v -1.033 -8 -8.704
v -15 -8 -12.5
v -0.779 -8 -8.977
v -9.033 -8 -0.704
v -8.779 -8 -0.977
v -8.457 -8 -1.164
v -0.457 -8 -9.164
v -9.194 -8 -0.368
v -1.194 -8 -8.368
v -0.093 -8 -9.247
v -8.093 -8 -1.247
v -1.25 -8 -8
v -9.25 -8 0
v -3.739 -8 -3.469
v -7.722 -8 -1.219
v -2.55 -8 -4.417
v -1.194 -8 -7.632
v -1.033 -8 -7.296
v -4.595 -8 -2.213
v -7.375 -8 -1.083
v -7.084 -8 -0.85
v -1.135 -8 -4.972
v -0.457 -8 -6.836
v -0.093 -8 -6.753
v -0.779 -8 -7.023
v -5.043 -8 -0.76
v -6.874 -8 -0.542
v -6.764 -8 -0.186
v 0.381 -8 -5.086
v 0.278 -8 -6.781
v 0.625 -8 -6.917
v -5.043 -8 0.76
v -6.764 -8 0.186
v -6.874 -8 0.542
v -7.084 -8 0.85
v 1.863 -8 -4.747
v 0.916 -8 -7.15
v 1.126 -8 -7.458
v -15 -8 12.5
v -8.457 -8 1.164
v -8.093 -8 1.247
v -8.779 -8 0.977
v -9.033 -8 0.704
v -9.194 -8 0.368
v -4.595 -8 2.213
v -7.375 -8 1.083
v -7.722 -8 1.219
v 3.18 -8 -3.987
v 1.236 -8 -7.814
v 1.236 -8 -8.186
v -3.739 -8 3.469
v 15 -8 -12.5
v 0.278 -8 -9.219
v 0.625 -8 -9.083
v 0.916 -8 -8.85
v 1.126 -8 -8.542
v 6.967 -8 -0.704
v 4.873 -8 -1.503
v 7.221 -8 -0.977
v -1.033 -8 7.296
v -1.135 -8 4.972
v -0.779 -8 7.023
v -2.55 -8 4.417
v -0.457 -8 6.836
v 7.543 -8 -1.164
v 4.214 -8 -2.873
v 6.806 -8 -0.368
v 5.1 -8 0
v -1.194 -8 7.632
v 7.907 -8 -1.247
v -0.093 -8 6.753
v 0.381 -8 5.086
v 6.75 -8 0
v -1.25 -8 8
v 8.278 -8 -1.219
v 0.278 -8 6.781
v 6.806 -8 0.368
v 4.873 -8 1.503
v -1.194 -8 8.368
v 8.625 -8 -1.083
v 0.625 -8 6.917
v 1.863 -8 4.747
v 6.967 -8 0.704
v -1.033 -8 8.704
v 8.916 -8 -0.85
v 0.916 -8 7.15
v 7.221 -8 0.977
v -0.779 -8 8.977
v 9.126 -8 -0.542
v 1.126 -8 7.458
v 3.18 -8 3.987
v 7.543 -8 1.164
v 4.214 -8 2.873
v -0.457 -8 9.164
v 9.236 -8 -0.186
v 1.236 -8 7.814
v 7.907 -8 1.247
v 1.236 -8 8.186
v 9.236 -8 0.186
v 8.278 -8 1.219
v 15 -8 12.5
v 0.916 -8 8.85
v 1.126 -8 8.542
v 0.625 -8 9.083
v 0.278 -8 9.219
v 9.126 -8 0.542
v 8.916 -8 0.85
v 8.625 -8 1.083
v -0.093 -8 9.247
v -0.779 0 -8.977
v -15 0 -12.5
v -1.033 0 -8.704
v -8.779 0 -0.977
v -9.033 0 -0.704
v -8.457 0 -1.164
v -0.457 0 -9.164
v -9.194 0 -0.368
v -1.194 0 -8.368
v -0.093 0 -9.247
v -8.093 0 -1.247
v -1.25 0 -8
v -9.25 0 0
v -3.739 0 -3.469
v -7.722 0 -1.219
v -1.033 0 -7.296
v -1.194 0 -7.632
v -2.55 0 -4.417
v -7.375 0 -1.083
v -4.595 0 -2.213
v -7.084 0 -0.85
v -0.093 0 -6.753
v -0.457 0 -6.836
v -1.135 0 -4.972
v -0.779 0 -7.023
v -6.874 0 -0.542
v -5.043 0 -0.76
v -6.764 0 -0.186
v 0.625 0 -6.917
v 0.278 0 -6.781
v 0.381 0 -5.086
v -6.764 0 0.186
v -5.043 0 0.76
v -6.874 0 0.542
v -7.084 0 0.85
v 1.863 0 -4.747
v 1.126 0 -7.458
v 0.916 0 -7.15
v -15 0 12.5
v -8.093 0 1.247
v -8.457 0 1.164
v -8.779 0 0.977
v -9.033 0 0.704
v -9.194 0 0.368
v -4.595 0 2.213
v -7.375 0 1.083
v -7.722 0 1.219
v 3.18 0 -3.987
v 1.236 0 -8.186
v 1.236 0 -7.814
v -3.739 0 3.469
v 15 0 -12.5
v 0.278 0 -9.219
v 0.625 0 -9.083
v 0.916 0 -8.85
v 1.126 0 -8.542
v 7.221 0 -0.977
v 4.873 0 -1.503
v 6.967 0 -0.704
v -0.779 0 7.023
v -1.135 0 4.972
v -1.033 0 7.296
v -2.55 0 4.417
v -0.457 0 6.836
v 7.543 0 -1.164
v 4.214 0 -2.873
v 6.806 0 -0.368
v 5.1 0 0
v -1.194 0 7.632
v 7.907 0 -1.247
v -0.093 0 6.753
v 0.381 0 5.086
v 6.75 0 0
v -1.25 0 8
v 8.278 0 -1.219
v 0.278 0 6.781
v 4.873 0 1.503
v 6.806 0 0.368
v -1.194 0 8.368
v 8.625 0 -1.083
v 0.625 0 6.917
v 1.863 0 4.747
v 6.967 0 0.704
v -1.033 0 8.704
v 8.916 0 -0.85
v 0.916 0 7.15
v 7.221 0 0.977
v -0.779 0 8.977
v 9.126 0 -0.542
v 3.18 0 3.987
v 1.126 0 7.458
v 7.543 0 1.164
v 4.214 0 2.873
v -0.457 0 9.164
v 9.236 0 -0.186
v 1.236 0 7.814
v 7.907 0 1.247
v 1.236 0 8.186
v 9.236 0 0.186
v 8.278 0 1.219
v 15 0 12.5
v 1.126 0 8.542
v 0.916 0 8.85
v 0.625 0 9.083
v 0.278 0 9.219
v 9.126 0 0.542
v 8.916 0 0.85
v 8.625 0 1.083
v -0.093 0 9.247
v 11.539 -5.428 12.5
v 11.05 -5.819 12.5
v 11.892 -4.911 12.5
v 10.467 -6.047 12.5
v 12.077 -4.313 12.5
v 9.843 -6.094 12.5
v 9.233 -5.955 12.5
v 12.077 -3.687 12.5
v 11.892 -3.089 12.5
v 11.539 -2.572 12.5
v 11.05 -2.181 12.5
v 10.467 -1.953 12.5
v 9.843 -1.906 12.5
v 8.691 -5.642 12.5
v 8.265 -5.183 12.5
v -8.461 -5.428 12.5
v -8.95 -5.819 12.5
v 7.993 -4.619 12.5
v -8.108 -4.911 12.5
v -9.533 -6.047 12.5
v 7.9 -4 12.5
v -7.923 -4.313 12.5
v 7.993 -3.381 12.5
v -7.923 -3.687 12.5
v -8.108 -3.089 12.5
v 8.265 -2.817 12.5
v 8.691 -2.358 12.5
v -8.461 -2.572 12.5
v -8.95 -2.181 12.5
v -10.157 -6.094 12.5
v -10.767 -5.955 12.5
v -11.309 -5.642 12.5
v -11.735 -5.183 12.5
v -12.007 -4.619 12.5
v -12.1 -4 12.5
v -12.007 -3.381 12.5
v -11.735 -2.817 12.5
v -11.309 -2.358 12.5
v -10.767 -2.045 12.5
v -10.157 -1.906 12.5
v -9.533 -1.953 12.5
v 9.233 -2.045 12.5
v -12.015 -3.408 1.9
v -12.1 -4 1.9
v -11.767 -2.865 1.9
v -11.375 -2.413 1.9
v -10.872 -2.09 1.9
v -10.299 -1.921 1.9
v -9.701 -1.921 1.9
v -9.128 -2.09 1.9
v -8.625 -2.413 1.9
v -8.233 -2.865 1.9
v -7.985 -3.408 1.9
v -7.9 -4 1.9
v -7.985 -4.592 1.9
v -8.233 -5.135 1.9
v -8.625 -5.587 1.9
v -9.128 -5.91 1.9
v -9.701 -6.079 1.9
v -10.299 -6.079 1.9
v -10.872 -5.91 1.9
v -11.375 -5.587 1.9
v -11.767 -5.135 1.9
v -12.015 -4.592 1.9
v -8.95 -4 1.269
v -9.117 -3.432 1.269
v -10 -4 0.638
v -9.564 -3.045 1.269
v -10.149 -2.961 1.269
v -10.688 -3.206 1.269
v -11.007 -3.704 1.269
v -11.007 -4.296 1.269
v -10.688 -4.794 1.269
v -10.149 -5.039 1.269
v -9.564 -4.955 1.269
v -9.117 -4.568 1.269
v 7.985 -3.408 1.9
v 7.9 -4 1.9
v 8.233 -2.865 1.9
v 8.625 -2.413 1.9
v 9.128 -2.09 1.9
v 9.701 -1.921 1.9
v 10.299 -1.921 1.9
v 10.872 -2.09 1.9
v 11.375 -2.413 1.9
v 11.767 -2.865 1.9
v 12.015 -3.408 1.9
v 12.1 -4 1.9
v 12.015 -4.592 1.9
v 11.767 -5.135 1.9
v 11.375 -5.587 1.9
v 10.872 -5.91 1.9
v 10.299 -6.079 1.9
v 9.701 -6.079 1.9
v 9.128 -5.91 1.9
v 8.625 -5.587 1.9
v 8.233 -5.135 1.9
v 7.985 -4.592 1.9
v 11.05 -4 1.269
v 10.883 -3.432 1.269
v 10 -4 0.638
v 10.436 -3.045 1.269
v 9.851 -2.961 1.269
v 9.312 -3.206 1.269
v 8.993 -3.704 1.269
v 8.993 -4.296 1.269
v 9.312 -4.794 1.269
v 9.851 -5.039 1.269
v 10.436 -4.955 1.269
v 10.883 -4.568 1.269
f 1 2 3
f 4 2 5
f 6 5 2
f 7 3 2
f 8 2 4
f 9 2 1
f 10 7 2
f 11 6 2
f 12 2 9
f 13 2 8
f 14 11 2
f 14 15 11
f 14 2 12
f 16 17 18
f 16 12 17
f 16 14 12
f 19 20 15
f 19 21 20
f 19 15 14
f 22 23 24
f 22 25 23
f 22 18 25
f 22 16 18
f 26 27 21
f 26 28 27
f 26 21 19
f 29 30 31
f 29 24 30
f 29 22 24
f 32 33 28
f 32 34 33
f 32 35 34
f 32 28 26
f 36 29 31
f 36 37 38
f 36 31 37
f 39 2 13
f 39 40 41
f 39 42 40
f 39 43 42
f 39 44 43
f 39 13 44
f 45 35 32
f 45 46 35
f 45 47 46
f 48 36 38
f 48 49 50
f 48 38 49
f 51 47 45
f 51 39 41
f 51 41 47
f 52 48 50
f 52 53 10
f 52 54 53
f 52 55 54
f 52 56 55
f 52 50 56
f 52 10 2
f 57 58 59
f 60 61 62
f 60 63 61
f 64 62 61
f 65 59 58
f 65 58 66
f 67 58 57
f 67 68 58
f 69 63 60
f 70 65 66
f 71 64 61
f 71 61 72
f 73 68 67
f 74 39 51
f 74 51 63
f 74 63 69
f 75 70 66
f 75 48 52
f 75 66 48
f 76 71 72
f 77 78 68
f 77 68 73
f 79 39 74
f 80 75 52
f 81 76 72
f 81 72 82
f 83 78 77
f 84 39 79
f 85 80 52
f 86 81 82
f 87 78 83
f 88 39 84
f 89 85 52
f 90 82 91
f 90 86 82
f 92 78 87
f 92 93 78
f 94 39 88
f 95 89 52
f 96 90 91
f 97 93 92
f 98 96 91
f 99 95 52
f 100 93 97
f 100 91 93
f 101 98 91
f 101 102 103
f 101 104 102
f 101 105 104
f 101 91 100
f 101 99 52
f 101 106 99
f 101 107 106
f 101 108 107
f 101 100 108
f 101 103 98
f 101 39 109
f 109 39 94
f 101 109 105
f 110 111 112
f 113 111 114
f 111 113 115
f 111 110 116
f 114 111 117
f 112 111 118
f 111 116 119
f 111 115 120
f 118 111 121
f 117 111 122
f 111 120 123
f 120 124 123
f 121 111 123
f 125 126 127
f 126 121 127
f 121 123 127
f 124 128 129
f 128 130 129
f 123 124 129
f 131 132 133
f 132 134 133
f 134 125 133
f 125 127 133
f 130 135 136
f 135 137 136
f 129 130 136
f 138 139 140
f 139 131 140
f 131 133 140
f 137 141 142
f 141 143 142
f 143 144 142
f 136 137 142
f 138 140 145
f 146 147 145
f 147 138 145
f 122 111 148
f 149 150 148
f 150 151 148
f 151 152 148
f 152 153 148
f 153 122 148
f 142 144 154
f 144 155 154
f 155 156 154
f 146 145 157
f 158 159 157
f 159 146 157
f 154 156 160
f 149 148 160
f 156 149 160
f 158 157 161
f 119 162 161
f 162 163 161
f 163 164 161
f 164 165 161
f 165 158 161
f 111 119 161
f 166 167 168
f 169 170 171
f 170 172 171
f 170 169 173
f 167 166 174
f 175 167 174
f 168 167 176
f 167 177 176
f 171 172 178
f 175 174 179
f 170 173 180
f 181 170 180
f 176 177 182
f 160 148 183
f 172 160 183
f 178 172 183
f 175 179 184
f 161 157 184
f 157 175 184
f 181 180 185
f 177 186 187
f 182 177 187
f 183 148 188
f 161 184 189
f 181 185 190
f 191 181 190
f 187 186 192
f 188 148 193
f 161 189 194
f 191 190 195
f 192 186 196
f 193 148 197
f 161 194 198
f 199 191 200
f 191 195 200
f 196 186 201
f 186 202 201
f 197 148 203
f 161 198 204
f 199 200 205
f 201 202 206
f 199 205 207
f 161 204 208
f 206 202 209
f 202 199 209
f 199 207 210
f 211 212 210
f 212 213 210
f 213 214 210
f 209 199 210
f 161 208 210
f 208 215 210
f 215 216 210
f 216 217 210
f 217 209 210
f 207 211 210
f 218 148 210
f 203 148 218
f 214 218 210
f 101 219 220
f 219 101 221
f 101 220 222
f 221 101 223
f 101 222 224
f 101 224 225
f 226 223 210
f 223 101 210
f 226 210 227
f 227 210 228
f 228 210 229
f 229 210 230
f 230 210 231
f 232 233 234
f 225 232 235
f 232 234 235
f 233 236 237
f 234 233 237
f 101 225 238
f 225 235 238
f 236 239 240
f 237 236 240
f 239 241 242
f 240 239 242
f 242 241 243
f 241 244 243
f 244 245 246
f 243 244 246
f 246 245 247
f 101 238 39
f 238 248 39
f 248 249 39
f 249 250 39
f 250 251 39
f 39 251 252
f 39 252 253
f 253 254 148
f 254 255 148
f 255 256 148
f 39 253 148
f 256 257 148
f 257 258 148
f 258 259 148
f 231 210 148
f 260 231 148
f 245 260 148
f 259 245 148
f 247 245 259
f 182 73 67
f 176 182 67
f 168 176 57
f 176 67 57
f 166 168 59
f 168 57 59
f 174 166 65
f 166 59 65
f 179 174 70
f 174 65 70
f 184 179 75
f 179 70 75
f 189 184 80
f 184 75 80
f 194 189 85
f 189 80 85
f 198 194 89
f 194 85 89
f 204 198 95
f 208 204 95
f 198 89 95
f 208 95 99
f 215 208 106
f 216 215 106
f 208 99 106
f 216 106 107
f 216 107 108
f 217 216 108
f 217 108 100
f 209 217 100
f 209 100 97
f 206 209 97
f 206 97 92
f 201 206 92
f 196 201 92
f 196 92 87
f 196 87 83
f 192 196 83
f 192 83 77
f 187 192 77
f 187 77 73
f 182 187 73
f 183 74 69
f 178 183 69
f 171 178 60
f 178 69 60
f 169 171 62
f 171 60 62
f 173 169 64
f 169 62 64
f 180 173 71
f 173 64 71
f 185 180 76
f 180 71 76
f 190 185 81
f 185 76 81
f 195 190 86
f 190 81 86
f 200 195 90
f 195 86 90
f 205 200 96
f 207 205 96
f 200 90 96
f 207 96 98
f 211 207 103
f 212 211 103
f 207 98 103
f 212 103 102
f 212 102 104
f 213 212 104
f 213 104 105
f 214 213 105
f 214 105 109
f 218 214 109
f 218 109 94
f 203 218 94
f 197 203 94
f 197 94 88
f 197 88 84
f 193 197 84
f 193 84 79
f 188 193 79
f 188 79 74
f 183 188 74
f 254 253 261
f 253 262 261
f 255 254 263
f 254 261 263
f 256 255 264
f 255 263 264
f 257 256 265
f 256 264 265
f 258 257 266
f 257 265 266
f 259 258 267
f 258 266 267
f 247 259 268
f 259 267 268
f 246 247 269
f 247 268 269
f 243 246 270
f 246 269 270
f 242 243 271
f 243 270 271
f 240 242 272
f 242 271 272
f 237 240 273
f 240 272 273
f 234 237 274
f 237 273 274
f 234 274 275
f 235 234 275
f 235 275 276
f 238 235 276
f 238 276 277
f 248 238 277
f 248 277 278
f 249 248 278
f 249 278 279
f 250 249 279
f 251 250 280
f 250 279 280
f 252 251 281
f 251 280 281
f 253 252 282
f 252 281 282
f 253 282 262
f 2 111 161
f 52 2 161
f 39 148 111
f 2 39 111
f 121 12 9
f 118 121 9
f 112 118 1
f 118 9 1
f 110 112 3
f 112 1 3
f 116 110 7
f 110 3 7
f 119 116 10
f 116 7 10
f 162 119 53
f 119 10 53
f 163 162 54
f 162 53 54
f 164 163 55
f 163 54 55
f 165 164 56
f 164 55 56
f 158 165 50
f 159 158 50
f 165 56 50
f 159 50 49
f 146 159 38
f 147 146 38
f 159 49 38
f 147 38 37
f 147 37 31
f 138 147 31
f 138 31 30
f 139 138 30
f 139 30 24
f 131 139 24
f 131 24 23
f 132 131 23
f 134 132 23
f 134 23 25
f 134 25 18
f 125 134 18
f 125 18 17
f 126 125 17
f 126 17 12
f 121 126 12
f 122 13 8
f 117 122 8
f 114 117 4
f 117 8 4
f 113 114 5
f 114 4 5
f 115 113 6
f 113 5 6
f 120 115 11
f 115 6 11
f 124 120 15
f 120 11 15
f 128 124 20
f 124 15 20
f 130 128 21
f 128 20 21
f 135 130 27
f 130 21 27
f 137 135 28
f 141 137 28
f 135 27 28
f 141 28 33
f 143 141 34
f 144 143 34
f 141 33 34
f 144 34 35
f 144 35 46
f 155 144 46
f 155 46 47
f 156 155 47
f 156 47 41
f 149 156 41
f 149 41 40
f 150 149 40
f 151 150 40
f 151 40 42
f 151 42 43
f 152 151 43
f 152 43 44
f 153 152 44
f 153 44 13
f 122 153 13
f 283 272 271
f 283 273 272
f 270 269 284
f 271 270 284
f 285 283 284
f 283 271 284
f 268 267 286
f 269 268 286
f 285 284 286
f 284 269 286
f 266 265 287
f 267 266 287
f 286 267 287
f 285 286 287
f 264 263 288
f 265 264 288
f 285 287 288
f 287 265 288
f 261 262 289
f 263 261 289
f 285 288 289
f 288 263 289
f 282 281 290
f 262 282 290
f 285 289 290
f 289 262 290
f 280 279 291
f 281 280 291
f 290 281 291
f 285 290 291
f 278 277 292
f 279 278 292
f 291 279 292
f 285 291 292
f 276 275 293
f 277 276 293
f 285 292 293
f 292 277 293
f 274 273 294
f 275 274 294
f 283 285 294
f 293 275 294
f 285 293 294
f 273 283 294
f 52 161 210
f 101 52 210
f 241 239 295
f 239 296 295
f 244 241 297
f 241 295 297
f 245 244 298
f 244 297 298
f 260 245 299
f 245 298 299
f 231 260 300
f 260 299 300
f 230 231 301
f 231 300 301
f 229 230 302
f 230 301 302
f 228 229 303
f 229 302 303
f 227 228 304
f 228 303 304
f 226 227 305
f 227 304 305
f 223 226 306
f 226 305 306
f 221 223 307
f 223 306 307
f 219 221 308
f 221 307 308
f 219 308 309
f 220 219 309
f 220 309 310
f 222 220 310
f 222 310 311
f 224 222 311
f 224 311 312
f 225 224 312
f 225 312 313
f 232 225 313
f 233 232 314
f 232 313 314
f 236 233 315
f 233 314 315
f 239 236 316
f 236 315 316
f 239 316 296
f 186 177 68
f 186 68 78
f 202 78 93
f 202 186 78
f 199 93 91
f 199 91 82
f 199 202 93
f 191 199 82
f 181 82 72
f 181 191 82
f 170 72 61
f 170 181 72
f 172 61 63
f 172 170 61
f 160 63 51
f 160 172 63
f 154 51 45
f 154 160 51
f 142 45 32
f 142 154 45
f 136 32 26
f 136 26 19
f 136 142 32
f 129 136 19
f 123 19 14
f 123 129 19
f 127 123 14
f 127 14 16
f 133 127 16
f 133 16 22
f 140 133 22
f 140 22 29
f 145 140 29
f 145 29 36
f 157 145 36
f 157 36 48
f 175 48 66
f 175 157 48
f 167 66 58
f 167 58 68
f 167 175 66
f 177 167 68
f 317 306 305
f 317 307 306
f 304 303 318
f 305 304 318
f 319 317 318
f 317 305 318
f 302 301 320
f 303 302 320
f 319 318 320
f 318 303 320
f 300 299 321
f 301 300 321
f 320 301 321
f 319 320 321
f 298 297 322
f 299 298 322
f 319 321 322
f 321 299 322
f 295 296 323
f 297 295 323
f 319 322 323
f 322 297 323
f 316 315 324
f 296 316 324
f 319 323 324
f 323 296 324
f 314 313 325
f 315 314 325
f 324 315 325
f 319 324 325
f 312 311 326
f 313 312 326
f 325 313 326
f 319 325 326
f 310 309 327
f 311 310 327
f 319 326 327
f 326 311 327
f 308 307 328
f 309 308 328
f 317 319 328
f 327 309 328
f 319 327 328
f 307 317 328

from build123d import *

# Parameters (mm, degrees)
F0_R     = 5.1
F1_DEPTH = 8
F3_D     = 2.5
F4_D     = 4.2
F4_DEPTH = 10.6
F4_TIP   = 1.2618073


with BuildPart() as f1:
    # F0 (on Front) → F1 (new body)
    with BuildSketch(Plane.XZ):
        with BuildLine():
            ThreePointArc((-7.80859375, 1.7395009766), (-5.6568542495, 5.6568542495), (-1.7395009766, 7.80859375))
            ThreePointArc((-1.7395009766, 7.80859375), (-1.3033535471, 9.1678054338), (0, 9.75))
            Line((0, 9.75), (0, 12.5))
            Line((0, 12.5), (-15, 12.5))
            Line((-15, 12.5), (-15, -12.5))
            Line((-15, -12.5), (0, -12.5))
            Line((0, -12.5), (0, -9.75))
            ThreePointArc((0, -9.75), (-1.3033535471, -9.1678054338), (-1.7395009766, -7.80859375))
            ThreePointArc((-1.7395009766, -7.80859375), (-5.6568542495, -5.6568542495), (-7.80859375, -1.7395009766))
            ThreePointArc((-7.80859375, -1.7395009766), (-9.75, 0), (-7.80859375, 1.7395009766))
        make_face()
        with BuildLine():
            ThreePointArc((1.7395009766, 7.80859375), (5.6568542495, 5.6568542495), (7.80859375, 1.7395009766))
            ThreePointArc((7.80859375, 1.7395009766), (9.1678054338, 1.3033535471), (9.75, 0))
            ThreePointArc((9.75, 0), (9.1678054338, -1.3033535471), (7.80859375, -1.7395009766))
            ThreePointArc((7.80859375, -1.7395009766), (5.6568542495, -5.6568542495), (1.7395009766, -7.80859375))
            ThreePointArc((1.7395009766, -7.80859375), (1.7473732728, -7.9041530099), (1.75, -8))
            ThreePointArc((1.75, -8), (1.2374368671, -9.2374368671), (0, -9.75))
            Line((0, -9.75), (0, -12.5))
            Line((0, -12.5), (15, -12.5))
            Line((15, -12.5), (15, 12.5))
            Line((15, 12.5), (0, 12.5))
            Line((0, 12.5), (0, 9.75))
            ThreePointArc((0, 9.75), (1.2374368671, 9.2374368671), (1.75, 8))
            ThreePointArc((1.75, 8), (1.7473732728, 7.9041530099), (1.7395009766, 7.80859375))
        make_face()
        with BuildLine():
            ThreePointArc((7.80859375, -1.7395009766), (6.25, 0), (7.80859375, 1.7395009766))
            ThreePointArc((7.80859375, 1.7395009766), (5.6568542495, 5.6568542495), (1.7395009766, 7.80859375))
            ThreePointArc((1.7395009766, 7.80859375), (0, 6.25), (-1.7395009766, 7.80859375))
            ThreePointArc((-1.7395009766, 7.80859375), (-5.6568542495, 5.6568542495), (-7.80859375, 1.7395009766))
            ThreePointArc((-7.80859375, 1.7395009766), (-6.6966464529, 1.1678054338), (-6.25, 0))
            ThreePointArc((-6.25, 0), (-6.6966464529, -1.1678054338), (-7.80859375, -1.7395009766))
            ThreePointArc((-7.80859375, -1.7395009766), (-5.6568542495, -5.6568542495), (-1.7395009766, -7.80859375))
            ThreePointArc((-1.7395009766, -7.80859375), (0, -6.25), (1.7395009766, -7.80859375))
            ThreePointArc((1.7395009766, -7.80859375), (5.6568542495, -5.6568542495), (7.80859375, -1.7395009766))
        make_face()
        Circle(F0_R, mode=Mode.SUBTRACT)
        with BuildLine():
            ThreePointArc((-1.7395009766, 7.80859375), (0, 8), (1.7395009766, 7.80859375))
            ThreePointArc((1.7395009766, 7.80859375), (1.7473732728, 7.9041530099), (1.75, 8))
            ThreePointArc((1.75, 8), (1.2374368671, 9.2374368671), (0, 9.75))
            ThreePointArc((0, 9.75), (-1.3033535471, 9.1678054338), (-1.7395009766, 7.80859375))
        make_face()
        with BuildLine():
            ThreePointArc((-7.80859375, -1.7395009766), (-8, 0), (-7.80859375, 1.7395009766))
            ThreePointArc((-7.80859375, 1.7395009766), (-9.75, 0), (-7.80859375, -1.7395009766))
        make_face()
        with BuildLine():
            ThreePointArc((-6.25, 0), (-6.6966464529, 1.1678054338), (-7.80859375, 1.7395009766))
            ThreePointArc((-7.80859375, 1.7395009766), (-8, 0), (-7.80859375, -1.7395009766))
            ThreePointArc((-7.80859375, -1.7395009766), (-6.6966464529, -1.1678054338), (-6.25, 0))
        make_face()
        with BuildLine():
            ThreePointArc((7.80859375, 1.7395009766), (7.9520044643, 0.875), (8, 0))
            ThreePointArc((8, 0), (7.9520044643, -0.875), (7.80859375, -1.7395009766))
            ThreePointArc((7.80859375, -1.7395009766), (9.1678054338, -1.3033535471), (9.75, 0))
            ThreePointArc((9.75, 0), (9.1678054338, 1.3033535471), (7.80859375, 1.7395009766))
        make_face()
        with BuildLine():
            ThreePointArc((7.80859375, -1.7395009766), (7.9520044643, -0.875), (8, 0))
            ThreePointArc((8, 0), (7.9520044643, 0.875), (7.80859375, 1.7395009766))
            ThreePointArc((7.80859375, 1.7395009766), (6.25, 0), (7.80859375, -1.7395009766))
        make_face()
        with BuildLine():
            ThreePointArc((-1.7395009766, -7.80859375), (0, -8), (1.7395009766, -7.80859375))
            ThreePointArc((1.7395009766, -7.80859375), (0, -6.25), (-1.7395009766, -7.80859375))
        make_face()
        with BuildLine():
            ThreePointArc((1.75, -8), (1.7473732728, -7.9041530099), (1.7395009766, -7.80859375))
            ThreePointArc((1.7395009766, -7.80859375), (0, -8), (-1.7395009766, -7.80859375))
            ThreePointArc((-1.7395009766, -7.80859375), (-1.3033535471, -9.1678054338), (0, -9.75))
            ThreePointArc((0, -9.75), (1.2374368671, -9.2374368671), (1.75, -8))
        make_face()
        with BuildLine():
            ThreePointArc((-1.7395009766, 7.80859375), (0, 6.25), (1.7395009766, 7.80859375))
            ThreePointArc((1.7395009766, 7.80859375), (0, 8), (-1.7395009766, 7.80859375))
        make_face()
    extrude(amount=F1_DEPTH)

    # F3 (through all)
    with Locations(Plane(origin=(0, 0, 0), x_dir=(1, 0, 0), z_dir=(0, 1, 0))):
        with Locations((0, -8), (8, 0), (-8, 0), (0, 8)):
            Hole(F3_D / 2)

    # F4
    with Locations(Plane.XY.offset(12.5)):
        with Locations((-10, -4), (10, -4)):
            Hole(F4_D / 2, depth=F4_DEPTH)
            with Locations((0, 0, -(F4_DEPTH + F4_TIP / 2))):  # 118° drill point
                Cone(0, F4_D / 2, F4_TIP, mode=Mode.SUBTRACT)


solid = f1.part
